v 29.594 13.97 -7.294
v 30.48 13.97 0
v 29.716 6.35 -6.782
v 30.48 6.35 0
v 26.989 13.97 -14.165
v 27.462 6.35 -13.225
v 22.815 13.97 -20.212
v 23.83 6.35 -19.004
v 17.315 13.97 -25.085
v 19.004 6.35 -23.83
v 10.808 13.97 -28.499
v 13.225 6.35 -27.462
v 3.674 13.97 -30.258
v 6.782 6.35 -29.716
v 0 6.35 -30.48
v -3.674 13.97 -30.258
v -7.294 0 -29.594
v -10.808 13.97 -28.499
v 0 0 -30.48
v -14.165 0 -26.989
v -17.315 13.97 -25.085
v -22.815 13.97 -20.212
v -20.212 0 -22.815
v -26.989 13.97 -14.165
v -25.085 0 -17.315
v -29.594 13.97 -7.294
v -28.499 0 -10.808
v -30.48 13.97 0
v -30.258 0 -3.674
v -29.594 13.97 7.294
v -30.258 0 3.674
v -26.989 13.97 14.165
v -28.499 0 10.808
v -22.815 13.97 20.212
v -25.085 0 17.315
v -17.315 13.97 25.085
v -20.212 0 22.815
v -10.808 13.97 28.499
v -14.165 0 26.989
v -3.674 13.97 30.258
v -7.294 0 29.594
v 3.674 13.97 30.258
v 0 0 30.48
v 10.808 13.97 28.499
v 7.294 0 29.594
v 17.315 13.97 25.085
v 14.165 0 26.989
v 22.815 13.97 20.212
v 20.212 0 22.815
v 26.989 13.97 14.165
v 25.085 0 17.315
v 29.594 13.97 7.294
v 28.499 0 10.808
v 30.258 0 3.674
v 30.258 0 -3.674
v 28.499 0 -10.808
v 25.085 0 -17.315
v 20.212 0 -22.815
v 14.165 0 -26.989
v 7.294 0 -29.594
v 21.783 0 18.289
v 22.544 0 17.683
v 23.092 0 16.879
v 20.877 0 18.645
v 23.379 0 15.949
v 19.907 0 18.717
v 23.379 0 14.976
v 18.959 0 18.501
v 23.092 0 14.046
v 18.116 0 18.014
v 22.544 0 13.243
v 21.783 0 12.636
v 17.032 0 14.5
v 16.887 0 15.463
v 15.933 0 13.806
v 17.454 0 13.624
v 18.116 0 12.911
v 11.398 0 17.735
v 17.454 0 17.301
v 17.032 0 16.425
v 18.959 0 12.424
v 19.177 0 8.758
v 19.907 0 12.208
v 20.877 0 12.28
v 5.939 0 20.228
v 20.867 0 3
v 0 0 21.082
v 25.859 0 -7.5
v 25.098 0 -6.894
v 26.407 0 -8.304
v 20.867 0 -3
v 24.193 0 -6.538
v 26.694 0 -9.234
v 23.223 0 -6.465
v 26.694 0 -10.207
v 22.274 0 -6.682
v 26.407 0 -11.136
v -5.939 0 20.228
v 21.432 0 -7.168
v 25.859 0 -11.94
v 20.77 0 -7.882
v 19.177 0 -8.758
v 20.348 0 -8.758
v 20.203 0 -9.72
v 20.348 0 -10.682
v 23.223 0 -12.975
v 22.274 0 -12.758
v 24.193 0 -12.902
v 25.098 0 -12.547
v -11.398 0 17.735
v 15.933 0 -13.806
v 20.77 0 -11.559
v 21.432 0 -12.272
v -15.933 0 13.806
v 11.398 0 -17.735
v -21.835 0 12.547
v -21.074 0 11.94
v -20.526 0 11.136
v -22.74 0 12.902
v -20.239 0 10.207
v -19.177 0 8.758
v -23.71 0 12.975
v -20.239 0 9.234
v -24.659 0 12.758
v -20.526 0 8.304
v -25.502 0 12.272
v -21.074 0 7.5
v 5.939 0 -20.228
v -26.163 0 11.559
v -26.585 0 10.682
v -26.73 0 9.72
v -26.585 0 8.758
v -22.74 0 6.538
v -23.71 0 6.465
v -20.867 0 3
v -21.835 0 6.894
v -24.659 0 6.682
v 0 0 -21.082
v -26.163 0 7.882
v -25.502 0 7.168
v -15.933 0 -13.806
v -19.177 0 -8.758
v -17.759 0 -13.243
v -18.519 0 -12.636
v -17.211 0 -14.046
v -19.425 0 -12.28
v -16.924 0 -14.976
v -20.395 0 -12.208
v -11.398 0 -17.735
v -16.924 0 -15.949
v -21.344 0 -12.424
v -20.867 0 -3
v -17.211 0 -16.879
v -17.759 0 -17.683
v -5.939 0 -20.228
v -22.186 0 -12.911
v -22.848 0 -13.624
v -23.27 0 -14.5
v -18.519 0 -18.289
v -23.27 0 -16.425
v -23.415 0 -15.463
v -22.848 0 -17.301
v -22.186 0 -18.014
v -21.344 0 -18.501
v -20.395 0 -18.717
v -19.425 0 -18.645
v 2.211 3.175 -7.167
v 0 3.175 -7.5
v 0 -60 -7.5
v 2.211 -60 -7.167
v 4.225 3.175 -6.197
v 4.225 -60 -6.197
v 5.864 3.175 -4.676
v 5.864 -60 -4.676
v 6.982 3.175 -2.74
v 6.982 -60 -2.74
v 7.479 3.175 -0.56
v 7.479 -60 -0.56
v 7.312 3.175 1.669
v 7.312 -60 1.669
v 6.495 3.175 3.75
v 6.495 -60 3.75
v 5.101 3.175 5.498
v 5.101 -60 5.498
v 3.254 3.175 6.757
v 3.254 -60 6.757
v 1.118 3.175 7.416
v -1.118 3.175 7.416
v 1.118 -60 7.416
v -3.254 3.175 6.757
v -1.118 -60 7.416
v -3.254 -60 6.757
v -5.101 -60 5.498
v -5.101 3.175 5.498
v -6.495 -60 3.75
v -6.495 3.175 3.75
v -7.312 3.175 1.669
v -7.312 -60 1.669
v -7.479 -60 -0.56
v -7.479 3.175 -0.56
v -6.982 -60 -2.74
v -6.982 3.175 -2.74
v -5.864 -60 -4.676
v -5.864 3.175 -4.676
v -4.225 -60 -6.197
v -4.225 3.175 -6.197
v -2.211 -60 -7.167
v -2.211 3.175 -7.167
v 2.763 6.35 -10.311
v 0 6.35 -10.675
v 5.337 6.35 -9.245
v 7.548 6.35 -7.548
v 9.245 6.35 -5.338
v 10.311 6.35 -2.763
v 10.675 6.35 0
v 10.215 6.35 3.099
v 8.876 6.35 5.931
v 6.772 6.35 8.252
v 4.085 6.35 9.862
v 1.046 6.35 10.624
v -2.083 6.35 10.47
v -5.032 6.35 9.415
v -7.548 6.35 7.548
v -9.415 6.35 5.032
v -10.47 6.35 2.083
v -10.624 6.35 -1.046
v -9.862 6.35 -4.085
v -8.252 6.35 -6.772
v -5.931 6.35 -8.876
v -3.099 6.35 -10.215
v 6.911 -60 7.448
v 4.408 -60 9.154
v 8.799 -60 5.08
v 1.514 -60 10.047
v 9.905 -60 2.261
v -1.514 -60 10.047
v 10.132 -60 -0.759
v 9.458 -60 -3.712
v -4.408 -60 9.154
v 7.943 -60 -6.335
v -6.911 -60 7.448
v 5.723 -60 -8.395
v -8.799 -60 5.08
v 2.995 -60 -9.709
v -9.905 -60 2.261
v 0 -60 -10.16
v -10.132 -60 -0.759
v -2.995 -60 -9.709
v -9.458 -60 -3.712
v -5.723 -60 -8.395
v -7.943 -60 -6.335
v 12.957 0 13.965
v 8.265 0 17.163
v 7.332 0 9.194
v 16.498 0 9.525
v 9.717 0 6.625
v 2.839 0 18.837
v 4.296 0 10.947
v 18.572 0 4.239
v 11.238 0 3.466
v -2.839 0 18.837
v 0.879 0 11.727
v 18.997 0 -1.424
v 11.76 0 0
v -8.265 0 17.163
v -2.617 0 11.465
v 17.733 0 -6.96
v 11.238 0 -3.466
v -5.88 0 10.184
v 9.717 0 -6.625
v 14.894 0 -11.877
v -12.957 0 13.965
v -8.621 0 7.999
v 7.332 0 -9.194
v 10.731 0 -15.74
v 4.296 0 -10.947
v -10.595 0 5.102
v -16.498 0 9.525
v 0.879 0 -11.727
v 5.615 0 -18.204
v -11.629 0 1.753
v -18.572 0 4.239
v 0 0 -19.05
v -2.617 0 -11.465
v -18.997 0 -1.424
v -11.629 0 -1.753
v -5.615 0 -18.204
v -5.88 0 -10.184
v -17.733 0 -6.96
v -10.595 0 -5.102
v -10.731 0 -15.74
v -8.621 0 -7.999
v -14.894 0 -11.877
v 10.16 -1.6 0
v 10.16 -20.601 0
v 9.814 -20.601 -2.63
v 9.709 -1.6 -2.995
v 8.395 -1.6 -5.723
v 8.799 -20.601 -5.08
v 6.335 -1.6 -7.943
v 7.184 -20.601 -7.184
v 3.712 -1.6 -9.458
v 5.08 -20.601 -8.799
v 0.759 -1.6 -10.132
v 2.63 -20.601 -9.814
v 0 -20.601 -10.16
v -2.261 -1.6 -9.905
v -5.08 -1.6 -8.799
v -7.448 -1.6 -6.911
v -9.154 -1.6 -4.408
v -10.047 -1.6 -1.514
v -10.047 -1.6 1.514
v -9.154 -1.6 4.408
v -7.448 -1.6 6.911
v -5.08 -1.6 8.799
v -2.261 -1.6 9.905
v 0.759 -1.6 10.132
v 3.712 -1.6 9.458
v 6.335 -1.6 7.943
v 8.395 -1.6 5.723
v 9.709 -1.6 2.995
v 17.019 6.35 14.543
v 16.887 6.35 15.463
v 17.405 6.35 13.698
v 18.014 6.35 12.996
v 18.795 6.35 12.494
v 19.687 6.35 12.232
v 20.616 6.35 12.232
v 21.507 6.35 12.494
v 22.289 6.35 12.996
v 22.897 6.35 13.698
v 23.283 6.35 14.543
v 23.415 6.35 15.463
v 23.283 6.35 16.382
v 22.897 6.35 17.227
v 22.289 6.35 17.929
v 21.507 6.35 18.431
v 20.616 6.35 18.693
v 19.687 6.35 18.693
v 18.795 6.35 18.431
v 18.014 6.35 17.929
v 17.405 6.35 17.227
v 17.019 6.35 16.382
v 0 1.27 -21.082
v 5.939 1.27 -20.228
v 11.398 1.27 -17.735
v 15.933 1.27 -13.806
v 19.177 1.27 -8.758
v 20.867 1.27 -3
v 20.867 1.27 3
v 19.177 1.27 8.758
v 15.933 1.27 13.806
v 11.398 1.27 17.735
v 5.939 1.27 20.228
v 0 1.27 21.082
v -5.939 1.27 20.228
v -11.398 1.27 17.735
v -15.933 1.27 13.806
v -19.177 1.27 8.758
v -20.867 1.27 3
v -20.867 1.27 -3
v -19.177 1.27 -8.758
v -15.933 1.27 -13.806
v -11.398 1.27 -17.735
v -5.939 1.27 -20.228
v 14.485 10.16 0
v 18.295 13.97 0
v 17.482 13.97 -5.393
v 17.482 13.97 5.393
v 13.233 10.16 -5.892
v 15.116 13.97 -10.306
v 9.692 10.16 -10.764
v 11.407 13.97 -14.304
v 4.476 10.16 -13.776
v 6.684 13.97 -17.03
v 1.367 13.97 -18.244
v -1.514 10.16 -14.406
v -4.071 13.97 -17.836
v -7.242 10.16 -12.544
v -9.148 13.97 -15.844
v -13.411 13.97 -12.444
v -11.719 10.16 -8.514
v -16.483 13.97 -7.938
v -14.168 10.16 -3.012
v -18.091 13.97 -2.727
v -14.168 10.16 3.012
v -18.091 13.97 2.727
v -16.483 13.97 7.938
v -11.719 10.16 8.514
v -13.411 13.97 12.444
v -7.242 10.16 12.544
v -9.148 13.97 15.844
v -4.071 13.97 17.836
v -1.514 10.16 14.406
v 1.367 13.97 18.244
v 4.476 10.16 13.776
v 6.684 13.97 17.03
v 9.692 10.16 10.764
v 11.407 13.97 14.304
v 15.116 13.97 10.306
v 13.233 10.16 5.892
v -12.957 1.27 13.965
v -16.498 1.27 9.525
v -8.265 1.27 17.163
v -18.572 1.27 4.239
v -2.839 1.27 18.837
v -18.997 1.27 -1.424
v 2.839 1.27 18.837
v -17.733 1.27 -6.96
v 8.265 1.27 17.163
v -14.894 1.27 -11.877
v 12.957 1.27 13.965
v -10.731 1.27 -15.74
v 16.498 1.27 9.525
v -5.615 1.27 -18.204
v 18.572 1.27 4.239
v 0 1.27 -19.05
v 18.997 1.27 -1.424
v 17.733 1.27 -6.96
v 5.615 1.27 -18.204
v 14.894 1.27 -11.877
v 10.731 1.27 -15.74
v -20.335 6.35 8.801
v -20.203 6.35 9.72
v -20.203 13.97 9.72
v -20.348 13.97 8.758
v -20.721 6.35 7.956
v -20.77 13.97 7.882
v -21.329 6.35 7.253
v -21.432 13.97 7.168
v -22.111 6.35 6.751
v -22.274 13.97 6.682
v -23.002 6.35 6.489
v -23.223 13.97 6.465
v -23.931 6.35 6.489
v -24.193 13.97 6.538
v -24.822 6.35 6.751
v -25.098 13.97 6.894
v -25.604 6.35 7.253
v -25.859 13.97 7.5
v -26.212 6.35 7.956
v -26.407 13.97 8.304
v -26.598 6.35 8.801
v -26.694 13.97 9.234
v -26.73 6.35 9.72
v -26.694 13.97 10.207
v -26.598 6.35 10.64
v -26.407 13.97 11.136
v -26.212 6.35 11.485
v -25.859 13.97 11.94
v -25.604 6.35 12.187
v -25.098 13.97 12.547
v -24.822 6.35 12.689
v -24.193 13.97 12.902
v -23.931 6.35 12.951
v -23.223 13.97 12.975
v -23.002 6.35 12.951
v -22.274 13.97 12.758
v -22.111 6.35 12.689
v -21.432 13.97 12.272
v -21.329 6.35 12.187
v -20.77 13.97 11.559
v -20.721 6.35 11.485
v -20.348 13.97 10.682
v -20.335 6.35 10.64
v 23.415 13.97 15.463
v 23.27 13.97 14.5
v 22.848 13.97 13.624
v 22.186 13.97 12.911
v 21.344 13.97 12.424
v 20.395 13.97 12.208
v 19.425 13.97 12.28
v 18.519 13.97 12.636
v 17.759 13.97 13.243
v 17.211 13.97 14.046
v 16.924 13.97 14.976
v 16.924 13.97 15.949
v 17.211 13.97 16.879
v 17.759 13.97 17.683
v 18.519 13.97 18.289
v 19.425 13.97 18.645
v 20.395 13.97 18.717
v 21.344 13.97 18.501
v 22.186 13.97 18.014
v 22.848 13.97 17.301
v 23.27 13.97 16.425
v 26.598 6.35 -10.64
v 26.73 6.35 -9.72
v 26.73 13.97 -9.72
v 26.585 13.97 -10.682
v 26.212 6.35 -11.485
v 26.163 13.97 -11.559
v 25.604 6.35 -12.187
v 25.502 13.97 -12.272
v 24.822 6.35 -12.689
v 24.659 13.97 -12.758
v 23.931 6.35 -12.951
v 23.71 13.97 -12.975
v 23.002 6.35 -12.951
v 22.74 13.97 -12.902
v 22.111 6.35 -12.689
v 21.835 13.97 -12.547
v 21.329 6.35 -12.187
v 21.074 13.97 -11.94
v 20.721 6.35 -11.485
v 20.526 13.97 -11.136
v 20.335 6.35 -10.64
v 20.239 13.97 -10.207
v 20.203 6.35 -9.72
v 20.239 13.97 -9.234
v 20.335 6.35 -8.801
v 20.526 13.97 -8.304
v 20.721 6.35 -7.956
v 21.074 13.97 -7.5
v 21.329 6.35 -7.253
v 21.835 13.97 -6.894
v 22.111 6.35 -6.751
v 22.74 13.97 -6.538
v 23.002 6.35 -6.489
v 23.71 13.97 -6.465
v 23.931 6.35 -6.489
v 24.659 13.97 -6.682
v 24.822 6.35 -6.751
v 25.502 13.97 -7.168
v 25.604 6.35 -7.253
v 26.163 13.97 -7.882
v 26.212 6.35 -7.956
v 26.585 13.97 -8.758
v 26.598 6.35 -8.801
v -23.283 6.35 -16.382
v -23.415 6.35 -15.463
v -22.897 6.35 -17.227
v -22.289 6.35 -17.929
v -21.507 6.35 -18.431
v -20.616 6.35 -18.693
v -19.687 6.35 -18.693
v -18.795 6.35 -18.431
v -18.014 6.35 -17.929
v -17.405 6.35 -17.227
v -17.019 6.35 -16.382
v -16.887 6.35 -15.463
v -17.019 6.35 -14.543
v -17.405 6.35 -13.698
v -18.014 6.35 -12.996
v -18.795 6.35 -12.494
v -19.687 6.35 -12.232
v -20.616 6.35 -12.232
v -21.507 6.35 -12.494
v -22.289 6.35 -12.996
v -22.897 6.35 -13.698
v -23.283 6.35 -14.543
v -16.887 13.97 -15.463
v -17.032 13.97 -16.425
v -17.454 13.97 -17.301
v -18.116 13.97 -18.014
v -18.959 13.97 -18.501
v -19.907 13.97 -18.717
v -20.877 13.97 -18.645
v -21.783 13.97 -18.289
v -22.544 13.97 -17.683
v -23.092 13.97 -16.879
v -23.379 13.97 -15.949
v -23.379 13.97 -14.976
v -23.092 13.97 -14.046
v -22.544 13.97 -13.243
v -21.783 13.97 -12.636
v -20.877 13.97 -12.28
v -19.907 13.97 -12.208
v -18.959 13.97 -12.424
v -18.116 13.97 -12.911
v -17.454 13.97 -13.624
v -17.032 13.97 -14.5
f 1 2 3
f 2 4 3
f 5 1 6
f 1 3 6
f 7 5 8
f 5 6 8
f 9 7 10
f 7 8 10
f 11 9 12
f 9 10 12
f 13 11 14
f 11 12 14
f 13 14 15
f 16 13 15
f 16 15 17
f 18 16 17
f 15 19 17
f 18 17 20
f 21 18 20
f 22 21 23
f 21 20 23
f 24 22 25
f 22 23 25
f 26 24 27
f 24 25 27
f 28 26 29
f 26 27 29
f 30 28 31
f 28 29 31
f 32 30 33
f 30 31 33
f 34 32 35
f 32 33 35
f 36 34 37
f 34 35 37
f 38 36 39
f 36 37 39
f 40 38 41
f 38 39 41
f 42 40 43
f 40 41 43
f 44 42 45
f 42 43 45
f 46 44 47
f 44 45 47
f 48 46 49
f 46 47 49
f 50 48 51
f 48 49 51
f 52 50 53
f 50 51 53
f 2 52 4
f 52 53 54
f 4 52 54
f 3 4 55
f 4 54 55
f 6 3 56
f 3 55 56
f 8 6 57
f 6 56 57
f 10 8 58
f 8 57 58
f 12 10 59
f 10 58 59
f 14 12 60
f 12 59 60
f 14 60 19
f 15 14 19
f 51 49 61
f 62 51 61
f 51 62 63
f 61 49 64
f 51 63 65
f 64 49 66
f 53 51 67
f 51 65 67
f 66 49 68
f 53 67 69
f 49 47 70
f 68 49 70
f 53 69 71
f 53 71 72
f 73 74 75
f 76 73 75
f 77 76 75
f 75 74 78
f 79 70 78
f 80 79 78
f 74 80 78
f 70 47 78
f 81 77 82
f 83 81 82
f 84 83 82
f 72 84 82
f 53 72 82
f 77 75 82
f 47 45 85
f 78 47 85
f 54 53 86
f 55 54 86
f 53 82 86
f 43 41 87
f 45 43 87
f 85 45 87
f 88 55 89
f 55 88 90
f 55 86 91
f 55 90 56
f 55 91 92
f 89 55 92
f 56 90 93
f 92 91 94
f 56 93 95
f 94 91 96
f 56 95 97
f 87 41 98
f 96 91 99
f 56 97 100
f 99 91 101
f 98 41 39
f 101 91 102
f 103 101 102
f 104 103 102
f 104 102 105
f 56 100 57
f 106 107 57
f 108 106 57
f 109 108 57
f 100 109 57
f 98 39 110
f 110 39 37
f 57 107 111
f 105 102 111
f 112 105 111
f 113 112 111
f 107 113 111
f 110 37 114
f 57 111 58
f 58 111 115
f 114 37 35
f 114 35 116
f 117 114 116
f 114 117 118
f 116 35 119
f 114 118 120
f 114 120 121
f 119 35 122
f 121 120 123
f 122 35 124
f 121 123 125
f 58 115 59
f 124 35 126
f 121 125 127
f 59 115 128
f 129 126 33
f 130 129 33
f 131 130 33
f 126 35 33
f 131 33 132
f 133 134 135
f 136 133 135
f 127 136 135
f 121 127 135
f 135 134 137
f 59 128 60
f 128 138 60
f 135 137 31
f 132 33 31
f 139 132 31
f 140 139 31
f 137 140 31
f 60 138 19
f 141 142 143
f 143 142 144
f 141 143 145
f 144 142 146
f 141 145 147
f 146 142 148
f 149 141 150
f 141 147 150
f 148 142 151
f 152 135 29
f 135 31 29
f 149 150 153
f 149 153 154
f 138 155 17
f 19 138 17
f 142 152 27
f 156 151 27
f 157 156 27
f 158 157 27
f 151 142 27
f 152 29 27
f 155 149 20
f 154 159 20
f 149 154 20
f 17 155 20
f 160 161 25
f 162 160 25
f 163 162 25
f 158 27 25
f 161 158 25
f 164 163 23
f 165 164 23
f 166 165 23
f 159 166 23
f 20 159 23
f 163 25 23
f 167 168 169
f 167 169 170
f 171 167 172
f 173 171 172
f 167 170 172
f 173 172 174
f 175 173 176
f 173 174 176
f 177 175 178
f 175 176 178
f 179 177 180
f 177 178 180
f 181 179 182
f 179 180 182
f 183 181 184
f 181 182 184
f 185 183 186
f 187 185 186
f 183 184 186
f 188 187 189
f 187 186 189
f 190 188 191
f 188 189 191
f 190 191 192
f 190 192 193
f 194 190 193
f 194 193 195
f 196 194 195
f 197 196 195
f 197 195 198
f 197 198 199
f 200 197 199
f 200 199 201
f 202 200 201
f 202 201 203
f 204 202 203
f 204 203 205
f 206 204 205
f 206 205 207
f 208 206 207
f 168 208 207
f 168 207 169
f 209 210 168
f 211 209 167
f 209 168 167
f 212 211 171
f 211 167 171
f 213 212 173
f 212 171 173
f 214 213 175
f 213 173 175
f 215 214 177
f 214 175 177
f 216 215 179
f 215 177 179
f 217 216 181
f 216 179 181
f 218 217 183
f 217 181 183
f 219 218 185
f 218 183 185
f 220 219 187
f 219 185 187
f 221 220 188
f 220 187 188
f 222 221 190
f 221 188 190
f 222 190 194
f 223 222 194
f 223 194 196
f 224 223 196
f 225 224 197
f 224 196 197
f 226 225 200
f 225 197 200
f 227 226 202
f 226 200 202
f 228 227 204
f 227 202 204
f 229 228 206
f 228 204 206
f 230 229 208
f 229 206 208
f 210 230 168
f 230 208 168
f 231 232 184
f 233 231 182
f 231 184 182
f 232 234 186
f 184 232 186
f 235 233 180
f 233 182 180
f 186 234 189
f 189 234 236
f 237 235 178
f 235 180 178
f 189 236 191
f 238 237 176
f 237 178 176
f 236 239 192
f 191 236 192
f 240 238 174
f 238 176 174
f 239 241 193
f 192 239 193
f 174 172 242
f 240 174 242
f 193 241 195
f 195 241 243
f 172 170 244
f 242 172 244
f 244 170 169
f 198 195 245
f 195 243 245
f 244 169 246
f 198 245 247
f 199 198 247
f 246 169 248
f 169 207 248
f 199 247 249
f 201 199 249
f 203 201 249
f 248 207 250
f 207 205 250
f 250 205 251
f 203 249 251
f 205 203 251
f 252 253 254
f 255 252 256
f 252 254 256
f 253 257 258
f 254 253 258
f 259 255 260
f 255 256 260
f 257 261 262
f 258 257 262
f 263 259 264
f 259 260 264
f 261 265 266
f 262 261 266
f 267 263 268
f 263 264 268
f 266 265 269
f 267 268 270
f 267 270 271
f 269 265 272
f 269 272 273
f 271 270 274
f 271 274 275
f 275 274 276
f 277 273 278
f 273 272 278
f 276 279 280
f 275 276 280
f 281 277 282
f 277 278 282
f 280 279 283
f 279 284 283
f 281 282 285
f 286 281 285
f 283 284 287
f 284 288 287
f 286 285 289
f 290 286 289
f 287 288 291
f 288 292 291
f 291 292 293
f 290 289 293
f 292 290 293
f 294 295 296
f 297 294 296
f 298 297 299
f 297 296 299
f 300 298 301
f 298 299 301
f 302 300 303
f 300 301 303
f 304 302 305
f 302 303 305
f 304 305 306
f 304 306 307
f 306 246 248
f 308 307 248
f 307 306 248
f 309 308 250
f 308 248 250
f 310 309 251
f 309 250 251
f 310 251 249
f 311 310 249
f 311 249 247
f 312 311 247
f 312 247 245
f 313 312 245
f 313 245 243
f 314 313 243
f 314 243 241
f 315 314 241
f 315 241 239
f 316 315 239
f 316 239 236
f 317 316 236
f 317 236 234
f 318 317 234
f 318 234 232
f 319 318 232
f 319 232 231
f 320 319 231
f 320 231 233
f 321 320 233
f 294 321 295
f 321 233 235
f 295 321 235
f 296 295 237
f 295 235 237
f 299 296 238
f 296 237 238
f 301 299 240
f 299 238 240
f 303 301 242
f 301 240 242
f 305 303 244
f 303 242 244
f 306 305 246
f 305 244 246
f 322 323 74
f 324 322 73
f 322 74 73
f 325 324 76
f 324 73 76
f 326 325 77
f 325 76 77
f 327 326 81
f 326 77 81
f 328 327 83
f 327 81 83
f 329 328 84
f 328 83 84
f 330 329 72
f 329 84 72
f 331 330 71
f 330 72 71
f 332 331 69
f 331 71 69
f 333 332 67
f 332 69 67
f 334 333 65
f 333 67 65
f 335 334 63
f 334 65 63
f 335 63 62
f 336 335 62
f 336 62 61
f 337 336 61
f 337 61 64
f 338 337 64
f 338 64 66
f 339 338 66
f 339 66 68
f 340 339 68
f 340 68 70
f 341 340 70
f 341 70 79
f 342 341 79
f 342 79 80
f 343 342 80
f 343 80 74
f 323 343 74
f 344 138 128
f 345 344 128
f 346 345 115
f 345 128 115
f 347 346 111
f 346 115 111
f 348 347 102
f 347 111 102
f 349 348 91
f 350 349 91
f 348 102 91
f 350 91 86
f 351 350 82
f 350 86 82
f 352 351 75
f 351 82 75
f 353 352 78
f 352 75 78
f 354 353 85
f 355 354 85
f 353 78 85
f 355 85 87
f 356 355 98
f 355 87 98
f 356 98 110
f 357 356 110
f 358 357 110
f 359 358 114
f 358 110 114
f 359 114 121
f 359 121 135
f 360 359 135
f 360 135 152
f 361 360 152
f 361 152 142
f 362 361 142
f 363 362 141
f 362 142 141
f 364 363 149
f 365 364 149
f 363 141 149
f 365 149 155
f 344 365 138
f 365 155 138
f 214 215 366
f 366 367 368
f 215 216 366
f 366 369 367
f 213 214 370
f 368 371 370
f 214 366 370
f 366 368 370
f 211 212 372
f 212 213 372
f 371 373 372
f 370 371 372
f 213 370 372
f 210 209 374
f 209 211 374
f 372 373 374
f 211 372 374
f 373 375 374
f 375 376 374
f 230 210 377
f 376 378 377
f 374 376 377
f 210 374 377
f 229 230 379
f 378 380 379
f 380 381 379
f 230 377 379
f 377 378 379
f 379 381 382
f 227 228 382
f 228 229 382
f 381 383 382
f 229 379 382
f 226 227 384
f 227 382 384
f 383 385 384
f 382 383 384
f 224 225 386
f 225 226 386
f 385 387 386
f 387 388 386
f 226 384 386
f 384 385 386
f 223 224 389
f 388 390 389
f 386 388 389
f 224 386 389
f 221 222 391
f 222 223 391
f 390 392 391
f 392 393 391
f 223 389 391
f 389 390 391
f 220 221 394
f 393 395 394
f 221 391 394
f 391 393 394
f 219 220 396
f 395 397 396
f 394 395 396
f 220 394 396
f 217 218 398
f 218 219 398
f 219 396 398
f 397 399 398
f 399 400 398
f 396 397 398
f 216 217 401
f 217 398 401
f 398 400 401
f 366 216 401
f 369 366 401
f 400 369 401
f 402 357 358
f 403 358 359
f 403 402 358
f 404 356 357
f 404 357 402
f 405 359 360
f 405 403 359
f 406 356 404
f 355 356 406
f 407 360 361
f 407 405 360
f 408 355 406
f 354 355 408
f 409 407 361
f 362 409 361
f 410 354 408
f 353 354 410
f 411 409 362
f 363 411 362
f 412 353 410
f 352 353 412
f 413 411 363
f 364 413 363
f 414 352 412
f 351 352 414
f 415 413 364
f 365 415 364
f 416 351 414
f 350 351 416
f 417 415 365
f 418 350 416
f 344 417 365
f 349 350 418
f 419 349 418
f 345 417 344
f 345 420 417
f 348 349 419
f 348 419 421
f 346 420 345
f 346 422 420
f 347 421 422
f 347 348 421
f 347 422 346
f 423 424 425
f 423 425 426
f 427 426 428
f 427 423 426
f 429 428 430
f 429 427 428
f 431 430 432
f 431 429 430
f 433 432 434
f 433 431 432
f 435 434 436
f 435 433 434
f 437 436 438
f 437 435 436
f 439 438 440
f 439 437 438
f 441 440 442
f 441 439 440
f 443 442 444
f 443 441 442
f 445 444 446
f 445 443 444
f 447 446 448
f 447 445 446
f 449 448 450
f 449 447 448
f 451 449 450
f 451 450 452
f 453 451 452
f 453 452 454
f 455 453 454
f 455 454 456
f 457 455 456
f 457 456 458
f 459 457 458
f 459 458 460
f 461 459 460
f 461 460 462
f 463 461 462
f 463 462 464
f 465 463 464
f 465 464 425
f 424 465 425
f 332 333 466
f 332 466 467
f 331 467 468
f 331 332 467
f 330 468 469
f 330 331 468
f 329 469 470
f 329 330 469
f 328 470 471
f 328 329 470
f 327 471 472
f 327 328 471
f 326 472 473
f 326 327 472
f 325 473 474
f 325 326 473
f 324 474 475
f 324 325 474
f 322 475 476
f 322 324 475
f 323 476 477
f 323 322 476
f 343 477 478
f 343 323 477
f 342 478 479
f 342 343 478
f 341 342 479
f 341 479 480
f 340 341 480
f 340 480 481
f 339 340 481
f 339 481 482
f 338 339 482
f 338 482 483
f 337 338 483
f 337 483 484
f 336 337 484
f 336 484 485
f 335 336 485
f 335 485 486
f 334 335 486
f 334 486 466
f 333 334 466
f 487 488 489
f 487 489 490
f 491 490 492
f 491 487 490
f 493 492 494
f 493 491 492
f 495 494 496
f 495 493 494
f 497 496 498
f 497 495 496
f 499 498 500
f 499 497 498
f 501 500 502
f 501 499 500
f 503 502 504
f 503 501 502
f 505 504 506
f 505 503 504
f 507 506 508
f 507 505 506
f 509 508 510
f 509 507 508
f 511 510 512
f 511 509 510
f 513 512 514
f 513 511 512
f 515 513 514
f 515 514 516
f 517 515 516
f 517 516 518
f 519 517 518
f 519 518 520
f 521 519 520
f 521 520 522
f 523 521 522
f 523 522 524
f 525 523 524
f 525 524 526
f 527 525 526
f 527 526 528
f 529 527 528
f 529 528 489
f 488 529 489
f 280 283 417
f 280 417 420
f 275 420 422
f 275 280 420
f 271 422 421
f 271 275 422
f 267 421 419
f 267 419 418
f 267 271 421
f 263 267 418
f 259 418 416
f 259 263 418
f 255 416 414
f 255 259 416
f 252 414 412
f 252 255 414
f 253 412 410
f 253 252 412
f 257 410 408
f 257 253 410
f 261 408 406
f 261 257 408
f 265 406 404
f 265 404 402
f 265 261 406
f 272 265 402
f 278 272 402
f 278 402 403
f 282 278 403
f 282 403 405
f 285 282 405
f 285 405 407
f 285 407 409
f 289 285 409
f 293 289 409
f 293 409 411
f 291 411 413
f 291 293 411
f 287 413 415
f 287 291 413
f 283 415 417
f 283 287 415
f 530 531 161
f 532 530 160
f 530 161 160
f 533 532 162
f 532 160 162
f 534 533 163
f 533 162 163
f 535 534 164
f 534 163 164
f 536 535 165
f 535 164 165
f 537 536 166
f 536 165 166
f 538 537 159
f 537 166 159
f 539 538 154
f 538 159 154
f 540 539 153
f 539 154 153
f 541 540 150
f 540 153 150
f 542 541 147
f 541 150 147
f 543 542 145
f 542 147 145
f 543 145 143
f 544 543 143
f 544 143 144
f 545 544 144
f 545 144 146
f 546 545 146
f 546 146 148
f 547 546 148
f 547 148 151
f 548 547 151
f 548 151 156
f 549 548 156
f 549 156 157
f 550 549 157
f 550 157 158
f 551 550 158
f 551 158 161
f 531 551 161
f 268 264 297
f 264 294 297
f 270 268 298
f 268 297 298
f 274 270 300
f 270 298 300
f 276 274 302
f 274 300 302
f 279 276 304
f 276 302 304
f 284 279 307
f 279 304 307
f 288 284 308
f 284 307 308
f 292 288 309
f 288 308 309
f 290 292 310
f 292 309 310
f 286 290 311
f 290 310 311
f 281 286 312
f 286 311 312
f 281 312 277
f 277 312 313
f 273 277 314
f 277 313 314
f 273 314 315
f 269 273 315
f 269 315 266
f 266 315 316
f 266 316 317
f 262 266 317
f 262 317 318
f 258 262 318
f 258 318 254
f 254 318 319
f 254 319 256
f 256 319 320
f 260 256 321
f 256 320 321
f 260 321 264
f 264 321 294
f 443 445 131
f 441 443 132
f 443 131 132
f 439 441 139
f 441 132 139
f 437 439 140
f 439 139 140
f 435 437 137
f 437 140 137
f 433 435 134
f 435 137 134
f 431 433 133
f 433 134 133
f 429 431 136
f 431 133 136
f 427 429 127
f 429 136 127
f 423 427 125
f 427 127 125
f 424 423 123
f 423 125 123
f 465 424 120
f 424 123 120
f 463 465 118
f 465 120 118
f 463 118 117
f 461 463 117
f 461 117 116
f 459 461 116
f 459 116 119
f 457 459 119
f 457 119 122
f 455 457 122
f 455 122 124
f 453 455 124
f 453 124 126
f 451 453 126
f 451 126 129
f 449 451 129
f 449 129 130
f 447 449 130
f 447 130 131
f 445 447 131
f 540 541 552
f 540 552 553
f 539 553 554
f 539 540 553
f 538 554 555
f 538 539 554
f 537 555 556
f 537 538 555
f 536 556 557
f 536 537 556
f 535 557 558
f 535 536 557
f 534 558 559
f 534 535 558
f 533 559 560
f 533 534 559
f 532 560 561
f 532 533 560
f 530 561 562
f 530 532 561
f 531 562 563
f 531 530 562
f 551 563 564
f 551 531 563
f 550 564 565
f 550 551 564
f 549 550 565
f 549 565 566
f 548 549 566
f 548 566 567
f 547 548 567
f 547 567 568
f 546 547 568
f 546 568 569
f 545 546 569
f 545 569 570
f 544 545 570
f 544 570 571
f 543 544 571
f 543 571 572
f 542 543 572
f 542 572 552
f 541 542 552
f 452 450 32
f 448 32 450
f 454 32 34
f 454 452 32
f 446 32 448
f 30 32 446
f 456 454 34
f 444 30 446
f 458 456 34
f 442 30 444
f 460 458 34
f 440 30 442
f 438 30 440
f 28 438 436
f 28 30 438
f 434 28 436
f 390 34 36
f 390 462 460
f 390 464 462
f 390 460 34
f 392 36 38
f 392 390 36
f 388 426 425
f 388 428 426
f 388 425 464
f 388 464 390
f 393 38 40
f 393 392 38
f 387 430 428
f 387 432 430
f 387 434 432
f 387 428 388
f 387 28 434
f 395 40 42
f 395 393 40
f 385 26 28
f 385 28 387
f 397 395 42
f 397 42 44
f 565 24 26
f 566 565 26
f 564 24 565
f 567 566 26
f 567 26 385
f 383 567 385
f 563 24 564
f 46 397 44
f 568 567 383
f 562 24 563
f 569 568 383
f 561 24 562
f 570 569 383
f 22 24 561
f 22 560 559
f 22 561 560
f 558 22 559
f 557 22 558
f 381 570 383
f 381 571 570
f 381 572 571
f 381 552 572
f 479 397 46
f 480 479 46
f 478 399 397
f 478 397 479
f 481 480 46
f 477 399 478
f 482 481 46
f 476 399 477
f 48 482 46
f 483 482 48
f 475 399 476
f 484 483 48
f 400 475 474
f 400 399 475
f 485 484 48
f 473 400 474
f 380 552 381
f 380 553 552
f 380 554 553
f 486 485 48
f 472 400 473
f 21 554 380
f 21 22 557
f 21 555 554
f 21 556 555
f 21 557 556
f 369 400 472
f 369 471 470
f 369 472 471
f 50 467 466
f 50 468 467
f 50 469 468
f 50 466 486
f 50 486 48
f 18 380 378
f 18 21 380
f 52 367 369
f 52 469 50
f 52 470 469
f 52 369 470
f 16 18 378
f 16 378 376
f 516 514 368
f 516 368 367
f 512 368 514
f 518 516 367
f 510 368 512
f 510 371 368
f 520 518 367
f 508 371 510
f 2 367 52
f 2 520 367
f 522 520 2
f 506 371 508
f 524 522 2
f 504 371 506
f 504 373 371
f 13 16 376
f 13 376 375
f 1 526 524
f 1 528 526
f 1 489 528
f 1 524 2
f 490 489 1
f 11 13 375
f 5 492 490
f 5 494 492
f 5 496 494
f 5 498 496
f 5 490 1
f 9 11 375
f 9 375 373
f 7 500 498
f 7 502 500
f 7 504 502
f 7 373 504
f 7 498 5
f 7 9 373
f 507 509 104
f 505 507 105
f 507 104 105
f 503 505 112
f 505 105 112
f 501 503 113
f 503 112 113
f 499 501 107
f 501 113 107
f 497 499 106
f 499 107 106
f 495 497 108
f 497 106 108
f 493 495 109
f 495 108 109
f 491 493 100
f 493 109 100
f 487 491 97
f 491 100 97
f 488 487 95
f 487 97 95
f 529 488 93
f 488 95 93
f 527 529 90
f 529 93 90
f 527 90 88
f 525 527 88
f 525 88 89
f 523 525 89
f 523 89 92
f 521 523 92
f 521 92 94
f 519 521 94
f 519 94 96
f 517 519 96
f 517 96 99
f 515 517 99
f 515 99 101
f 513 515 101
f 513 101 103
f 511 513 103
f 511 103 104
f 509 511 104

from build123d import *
from build123d.topology import SkipClean

# Parameters (mm, degrees)
SKETCH5_R                   = 7.5
CUT_EXTRUDE1_DEPTH          = 90
SKETCH6_R                   = 3.5
CUT_EXTRUDE2_DEPTH          = 20
CIRPATTERN1_COUNT           = 6
SKETCH11_R                  = 3.18
CUT_EXTRUDE4_DEPTH          = 101.105860558
SKETCH23_R                  = 30.48
CUT_EXTRUDE6_DEPTH          = 80.122584091
F_1_4_CLEARANCE_HOLE1_D     = 6.5278
F_1_4_CLEARANCE_HOLE1_DEPTH = 15.4203
F_1_4_CLEARANCE_HOLE1_TIP   = 1.961148974
CHAMFER1_SIZE               = 3.175
SKETCH26_OUTSIDE_W          = 84.718
SKETCH26_OUTSIDE_H          = 84.718
SKETCH26_OUTSIDE_R          = 15
FOR_TURNING_EASE_DEPTH      = 74.878689756
DELETEFACE2_START           = -60.0000001
DELETEFACE2_OUTLINE_R       = 15
DELETEFACE2_OUTLINE_R_2     = 10.16
DELETEFACE2_DEPTH           = 60.0000001
CHAMFER3_SIZE               = 1.6
SKETCH30_R                  = 21.082
SKETCH30_R_2                = 19.05
GASKET_GROOVE_DEPTH         = 1.27
MOVE_START                  = 6.35
MOVE_FACE3_OUTLINE_R        = 30.48
MOVE_FACE3_OUTLINE_R_2      = 3.2639
MOVE_FACE3_DEPTH            = 7.62


with BuildPart() as part:
    # Sketch1 → Revolve1 (revolve)
    with BuildSketch(Plane(origin=(0, 0, 0), x_dir=(0, 0, -1), z_dir=(1, 0, 0))):
        Polygon((0, 30.35), (12.7, 30.35), (12.7, 6.35), (30.48, 6.35), (30.48, 0), (15.68, 0), (10.16, -20.600920458), (10.16, -60), (0, -60), align=None)
    revolve(axis=Axis((0, 0, 0), (0, 1, 0)))

    # Sketch5 → Cut-Extrude1 (cut)
    with BuildSketch(Plane.XZ.offset(60)):
        with Locations(Location((0, 0, 0), (0, 0, 270))):
            Circle(SKETCH5_R)
    extrude(amount=-CUT_EXTRUDE1_DEPTH, mode=Mode.SUBTRACT)

    # Sketch6 → Cut-Extrude2 (cut, symmetric)
    with BuildSketch(Plane.XY):
        with Locations((0, 16.659966967)):
            Circle(SKETCH6_R)
    cut_extrude2 = extrude(amount=CUT_EXTRUDE2_DEPTH, both=True, mode=Mode.SUBTRACT)

    # CirPattern1: Cut-Extrude2 ×6 about axis
    cirpattern1_axis = Axis((0, 30.35, 0), (0, -1, 0))
    for i in range(1, CIRPATTERN1_COUNT):
        add(cut_extrude2.rotate(cirpattern1_axis, i * 360 / CIRPATTERN1_COUNT), mode=Mode.SUBTRACT)

    # Sketch11 → Cut-Extrude4 (cut, through all)
    with BuildSketch(Plane(origin=(0, 30.35, 0), x_dir=(1, 0, 0), z_dir=(0, 1, 0))):
        with Locations(Location((0, 0, 0), (0, 0, 270))):
            Circle(SKETCH11_R)
    extrude(amount=-CUT_EXTRUDE4_DEPTH, mode=Mode.SUBTRACT)

    # Sketch23 → Cut-Extrude6 (cut, through all)
    with BuildSketch(Plane(origin=(0, 6.35, 0), x_dir=(1, 0, 0), z_dir=(0, 1, 0))):
        with Locations(Location((0, 0, 0), (0, 0, 90))):
            Circle(SKETCH23_R)
    extrude(amount=CUT_EXTRUDE6_DEPTH, mode=Mode.SUBTRACT)

    # 1/4 Clearance Hole1
    with Locations(Plane(origin=(0, 6.35, 0), x_dir=(1, 0, 0), z_dir=(0, 1, 0))):
        with Locations((-20.151174843, 15.462540297), (23.466540126, 9.720159182), (20.151174843, -15.462540297), (-23.466540126, -9.720159182)):
            Hole(F_1_4_CLEARANCE_HOLE1_D / 2, depth=F_1_4_CLEARANCE_HOLE1_DEPTH)
            with Locations((0, 0, -(F_1_4_CLEARANCE_HOLE1_DEPTH + F_1_4_CLEARANCE_HOLE1_TIP / 2))):  # 118° drill point
                Cone(0, F_1_4_CLEARANCE_HOLE1_D / 2, F_1_4_CLEARANCE_HOLE1_TIP, mode=Mode.SUBTRACT)

    # Chamfer1
    chamfer1_edges = [part.edges().sort_by_distance(p)[0] for p in [
        (0, 6.35, 7.5),
    ]]
    chamfer(chamfer1_edges, length=CHAMFER1_SIZE)

    # Sketch26 outside → for-turning-ease (cut, through all)
    with BuildSketch(Plane.XZ):
        Rectangle(SKETCH26_OUTSIDE_W, SKETCH26_OUTSIDE_H)
        with Locations(Location((0, 0, 0), (0, 0, 90))):
            Circle(SKETCH26_OUTSIDE_R, mode=Mode.SUBTRACT)
    extrude(amount=FOR_TURNING_EASE_DEPTH, mode=Mode.SUBTRACT)

    # DeleteFace2: read off the stored shape, not the designer's step
    # DeleteFace2 outline → DeleteFace2 (cut)
    with BuildSketch(Plane(origin=(0, 0, 0), x_dir=(1, 0, 0), z_dir=(0, 1, 0)).offset(DELETEFACE2_START)):
        Circle(DELETEFACE2_OUTLINE_R)
        Circle(DELETEFACE2_OUTLINE_R_2, mode=Mode.SUBTRACT)
    extrude(amount=DELETEFACE2_DEPTH, mode=Mode.SUBTRACT)

    # Chamfer3
    # the kernel refuses this chamfer: 1.6 mm, written as the material it adds along each edge
    with BuildSketch(Plane(origin=(0, 0, 0), x_dir=(1, 0, 0), z_dir=(0, 0, 1))) as chamfer3_piece_1:
        Polygon((10.16 + CHAMFER3_SIZE, 0), (10.16, -CHAMFER3_SIZE), (10.16, 0), align=None)
    revolve(axis=Axis((0, 0, 0), (0, 1, 0)))

    # Sketch30 → gasket_groove (cut)
    with BuildSketch(Plane.XZ):
        with Locations(Location((0, 0, 0), (0, 0, 270))):
            Circle(SKETCH30_R)
        with Locations(Location((0, 0, 0), (0, 0, 270))):
            Circle(SKETCH30_R_2, mode=Mode.SUBTRACT)
    extrude(amount=-GASKET_GROOVE_DEPTH, mode=Mode.SUBTRACT)

    # Move Face3: read off the stored shape, not the designer's step
    # Move Face3 outline → Move Face3 (add)
    with SkipClean():  # the faces are left unmerged after this step: merging them gives an invalid solid
        with BuildSketch(Plane(origin=(0, 0, 0), x_dir=(1, 0, 0), z_dir=(0, 1, 0)).offset(MOVE_START)):
            Circle(MOVE_FACE3_OUTLINE_R)
            with Locations((-23.466540126, -9.720159182)):
                Circle(MOVE_FACE3_OUTLINE_R_2, mode=Mode.SUBTRACT)
            with Locations((20.151174843, -15.462540297)):
                Circle(MOVE_FACE3_OUTLINE_R_2, mode=Mode.SUBTRACT)
            with Locations((-20.151174843, 15.462540297)):
                Circle(MOVE_FACE3_OUTLINE_R_2, mode=Mode.SUBTRACT)
            with Locations((23.466540126, 9.720159182)):
                Circle(MOVE_FACE3_OUTLINE_R_2, mode=Mode.SUBTRACT)
        extrude(amount=MOVE_FACE3_DEPTH)
    add(part.part.scale(1), mode=Mode.REPLACE)  # the faces are merged on a copy

    # Move Face3 2 outline → Move Face3 2 (revolve, cut)
    with SkipClean():  # the faces are left unmerged after this step: merging them gives an invalid solid
        with BuildSketch(Plane.XY):
            Polygon((18.295, 13.97), (0, 13.97), (0, 6.35), (10.675, 6.35), align=None)
        revolve(axis=Axis((0, 0, 0), (0, 1, 0)), mode=Mode.SUBTRACT)


solid = part.part
